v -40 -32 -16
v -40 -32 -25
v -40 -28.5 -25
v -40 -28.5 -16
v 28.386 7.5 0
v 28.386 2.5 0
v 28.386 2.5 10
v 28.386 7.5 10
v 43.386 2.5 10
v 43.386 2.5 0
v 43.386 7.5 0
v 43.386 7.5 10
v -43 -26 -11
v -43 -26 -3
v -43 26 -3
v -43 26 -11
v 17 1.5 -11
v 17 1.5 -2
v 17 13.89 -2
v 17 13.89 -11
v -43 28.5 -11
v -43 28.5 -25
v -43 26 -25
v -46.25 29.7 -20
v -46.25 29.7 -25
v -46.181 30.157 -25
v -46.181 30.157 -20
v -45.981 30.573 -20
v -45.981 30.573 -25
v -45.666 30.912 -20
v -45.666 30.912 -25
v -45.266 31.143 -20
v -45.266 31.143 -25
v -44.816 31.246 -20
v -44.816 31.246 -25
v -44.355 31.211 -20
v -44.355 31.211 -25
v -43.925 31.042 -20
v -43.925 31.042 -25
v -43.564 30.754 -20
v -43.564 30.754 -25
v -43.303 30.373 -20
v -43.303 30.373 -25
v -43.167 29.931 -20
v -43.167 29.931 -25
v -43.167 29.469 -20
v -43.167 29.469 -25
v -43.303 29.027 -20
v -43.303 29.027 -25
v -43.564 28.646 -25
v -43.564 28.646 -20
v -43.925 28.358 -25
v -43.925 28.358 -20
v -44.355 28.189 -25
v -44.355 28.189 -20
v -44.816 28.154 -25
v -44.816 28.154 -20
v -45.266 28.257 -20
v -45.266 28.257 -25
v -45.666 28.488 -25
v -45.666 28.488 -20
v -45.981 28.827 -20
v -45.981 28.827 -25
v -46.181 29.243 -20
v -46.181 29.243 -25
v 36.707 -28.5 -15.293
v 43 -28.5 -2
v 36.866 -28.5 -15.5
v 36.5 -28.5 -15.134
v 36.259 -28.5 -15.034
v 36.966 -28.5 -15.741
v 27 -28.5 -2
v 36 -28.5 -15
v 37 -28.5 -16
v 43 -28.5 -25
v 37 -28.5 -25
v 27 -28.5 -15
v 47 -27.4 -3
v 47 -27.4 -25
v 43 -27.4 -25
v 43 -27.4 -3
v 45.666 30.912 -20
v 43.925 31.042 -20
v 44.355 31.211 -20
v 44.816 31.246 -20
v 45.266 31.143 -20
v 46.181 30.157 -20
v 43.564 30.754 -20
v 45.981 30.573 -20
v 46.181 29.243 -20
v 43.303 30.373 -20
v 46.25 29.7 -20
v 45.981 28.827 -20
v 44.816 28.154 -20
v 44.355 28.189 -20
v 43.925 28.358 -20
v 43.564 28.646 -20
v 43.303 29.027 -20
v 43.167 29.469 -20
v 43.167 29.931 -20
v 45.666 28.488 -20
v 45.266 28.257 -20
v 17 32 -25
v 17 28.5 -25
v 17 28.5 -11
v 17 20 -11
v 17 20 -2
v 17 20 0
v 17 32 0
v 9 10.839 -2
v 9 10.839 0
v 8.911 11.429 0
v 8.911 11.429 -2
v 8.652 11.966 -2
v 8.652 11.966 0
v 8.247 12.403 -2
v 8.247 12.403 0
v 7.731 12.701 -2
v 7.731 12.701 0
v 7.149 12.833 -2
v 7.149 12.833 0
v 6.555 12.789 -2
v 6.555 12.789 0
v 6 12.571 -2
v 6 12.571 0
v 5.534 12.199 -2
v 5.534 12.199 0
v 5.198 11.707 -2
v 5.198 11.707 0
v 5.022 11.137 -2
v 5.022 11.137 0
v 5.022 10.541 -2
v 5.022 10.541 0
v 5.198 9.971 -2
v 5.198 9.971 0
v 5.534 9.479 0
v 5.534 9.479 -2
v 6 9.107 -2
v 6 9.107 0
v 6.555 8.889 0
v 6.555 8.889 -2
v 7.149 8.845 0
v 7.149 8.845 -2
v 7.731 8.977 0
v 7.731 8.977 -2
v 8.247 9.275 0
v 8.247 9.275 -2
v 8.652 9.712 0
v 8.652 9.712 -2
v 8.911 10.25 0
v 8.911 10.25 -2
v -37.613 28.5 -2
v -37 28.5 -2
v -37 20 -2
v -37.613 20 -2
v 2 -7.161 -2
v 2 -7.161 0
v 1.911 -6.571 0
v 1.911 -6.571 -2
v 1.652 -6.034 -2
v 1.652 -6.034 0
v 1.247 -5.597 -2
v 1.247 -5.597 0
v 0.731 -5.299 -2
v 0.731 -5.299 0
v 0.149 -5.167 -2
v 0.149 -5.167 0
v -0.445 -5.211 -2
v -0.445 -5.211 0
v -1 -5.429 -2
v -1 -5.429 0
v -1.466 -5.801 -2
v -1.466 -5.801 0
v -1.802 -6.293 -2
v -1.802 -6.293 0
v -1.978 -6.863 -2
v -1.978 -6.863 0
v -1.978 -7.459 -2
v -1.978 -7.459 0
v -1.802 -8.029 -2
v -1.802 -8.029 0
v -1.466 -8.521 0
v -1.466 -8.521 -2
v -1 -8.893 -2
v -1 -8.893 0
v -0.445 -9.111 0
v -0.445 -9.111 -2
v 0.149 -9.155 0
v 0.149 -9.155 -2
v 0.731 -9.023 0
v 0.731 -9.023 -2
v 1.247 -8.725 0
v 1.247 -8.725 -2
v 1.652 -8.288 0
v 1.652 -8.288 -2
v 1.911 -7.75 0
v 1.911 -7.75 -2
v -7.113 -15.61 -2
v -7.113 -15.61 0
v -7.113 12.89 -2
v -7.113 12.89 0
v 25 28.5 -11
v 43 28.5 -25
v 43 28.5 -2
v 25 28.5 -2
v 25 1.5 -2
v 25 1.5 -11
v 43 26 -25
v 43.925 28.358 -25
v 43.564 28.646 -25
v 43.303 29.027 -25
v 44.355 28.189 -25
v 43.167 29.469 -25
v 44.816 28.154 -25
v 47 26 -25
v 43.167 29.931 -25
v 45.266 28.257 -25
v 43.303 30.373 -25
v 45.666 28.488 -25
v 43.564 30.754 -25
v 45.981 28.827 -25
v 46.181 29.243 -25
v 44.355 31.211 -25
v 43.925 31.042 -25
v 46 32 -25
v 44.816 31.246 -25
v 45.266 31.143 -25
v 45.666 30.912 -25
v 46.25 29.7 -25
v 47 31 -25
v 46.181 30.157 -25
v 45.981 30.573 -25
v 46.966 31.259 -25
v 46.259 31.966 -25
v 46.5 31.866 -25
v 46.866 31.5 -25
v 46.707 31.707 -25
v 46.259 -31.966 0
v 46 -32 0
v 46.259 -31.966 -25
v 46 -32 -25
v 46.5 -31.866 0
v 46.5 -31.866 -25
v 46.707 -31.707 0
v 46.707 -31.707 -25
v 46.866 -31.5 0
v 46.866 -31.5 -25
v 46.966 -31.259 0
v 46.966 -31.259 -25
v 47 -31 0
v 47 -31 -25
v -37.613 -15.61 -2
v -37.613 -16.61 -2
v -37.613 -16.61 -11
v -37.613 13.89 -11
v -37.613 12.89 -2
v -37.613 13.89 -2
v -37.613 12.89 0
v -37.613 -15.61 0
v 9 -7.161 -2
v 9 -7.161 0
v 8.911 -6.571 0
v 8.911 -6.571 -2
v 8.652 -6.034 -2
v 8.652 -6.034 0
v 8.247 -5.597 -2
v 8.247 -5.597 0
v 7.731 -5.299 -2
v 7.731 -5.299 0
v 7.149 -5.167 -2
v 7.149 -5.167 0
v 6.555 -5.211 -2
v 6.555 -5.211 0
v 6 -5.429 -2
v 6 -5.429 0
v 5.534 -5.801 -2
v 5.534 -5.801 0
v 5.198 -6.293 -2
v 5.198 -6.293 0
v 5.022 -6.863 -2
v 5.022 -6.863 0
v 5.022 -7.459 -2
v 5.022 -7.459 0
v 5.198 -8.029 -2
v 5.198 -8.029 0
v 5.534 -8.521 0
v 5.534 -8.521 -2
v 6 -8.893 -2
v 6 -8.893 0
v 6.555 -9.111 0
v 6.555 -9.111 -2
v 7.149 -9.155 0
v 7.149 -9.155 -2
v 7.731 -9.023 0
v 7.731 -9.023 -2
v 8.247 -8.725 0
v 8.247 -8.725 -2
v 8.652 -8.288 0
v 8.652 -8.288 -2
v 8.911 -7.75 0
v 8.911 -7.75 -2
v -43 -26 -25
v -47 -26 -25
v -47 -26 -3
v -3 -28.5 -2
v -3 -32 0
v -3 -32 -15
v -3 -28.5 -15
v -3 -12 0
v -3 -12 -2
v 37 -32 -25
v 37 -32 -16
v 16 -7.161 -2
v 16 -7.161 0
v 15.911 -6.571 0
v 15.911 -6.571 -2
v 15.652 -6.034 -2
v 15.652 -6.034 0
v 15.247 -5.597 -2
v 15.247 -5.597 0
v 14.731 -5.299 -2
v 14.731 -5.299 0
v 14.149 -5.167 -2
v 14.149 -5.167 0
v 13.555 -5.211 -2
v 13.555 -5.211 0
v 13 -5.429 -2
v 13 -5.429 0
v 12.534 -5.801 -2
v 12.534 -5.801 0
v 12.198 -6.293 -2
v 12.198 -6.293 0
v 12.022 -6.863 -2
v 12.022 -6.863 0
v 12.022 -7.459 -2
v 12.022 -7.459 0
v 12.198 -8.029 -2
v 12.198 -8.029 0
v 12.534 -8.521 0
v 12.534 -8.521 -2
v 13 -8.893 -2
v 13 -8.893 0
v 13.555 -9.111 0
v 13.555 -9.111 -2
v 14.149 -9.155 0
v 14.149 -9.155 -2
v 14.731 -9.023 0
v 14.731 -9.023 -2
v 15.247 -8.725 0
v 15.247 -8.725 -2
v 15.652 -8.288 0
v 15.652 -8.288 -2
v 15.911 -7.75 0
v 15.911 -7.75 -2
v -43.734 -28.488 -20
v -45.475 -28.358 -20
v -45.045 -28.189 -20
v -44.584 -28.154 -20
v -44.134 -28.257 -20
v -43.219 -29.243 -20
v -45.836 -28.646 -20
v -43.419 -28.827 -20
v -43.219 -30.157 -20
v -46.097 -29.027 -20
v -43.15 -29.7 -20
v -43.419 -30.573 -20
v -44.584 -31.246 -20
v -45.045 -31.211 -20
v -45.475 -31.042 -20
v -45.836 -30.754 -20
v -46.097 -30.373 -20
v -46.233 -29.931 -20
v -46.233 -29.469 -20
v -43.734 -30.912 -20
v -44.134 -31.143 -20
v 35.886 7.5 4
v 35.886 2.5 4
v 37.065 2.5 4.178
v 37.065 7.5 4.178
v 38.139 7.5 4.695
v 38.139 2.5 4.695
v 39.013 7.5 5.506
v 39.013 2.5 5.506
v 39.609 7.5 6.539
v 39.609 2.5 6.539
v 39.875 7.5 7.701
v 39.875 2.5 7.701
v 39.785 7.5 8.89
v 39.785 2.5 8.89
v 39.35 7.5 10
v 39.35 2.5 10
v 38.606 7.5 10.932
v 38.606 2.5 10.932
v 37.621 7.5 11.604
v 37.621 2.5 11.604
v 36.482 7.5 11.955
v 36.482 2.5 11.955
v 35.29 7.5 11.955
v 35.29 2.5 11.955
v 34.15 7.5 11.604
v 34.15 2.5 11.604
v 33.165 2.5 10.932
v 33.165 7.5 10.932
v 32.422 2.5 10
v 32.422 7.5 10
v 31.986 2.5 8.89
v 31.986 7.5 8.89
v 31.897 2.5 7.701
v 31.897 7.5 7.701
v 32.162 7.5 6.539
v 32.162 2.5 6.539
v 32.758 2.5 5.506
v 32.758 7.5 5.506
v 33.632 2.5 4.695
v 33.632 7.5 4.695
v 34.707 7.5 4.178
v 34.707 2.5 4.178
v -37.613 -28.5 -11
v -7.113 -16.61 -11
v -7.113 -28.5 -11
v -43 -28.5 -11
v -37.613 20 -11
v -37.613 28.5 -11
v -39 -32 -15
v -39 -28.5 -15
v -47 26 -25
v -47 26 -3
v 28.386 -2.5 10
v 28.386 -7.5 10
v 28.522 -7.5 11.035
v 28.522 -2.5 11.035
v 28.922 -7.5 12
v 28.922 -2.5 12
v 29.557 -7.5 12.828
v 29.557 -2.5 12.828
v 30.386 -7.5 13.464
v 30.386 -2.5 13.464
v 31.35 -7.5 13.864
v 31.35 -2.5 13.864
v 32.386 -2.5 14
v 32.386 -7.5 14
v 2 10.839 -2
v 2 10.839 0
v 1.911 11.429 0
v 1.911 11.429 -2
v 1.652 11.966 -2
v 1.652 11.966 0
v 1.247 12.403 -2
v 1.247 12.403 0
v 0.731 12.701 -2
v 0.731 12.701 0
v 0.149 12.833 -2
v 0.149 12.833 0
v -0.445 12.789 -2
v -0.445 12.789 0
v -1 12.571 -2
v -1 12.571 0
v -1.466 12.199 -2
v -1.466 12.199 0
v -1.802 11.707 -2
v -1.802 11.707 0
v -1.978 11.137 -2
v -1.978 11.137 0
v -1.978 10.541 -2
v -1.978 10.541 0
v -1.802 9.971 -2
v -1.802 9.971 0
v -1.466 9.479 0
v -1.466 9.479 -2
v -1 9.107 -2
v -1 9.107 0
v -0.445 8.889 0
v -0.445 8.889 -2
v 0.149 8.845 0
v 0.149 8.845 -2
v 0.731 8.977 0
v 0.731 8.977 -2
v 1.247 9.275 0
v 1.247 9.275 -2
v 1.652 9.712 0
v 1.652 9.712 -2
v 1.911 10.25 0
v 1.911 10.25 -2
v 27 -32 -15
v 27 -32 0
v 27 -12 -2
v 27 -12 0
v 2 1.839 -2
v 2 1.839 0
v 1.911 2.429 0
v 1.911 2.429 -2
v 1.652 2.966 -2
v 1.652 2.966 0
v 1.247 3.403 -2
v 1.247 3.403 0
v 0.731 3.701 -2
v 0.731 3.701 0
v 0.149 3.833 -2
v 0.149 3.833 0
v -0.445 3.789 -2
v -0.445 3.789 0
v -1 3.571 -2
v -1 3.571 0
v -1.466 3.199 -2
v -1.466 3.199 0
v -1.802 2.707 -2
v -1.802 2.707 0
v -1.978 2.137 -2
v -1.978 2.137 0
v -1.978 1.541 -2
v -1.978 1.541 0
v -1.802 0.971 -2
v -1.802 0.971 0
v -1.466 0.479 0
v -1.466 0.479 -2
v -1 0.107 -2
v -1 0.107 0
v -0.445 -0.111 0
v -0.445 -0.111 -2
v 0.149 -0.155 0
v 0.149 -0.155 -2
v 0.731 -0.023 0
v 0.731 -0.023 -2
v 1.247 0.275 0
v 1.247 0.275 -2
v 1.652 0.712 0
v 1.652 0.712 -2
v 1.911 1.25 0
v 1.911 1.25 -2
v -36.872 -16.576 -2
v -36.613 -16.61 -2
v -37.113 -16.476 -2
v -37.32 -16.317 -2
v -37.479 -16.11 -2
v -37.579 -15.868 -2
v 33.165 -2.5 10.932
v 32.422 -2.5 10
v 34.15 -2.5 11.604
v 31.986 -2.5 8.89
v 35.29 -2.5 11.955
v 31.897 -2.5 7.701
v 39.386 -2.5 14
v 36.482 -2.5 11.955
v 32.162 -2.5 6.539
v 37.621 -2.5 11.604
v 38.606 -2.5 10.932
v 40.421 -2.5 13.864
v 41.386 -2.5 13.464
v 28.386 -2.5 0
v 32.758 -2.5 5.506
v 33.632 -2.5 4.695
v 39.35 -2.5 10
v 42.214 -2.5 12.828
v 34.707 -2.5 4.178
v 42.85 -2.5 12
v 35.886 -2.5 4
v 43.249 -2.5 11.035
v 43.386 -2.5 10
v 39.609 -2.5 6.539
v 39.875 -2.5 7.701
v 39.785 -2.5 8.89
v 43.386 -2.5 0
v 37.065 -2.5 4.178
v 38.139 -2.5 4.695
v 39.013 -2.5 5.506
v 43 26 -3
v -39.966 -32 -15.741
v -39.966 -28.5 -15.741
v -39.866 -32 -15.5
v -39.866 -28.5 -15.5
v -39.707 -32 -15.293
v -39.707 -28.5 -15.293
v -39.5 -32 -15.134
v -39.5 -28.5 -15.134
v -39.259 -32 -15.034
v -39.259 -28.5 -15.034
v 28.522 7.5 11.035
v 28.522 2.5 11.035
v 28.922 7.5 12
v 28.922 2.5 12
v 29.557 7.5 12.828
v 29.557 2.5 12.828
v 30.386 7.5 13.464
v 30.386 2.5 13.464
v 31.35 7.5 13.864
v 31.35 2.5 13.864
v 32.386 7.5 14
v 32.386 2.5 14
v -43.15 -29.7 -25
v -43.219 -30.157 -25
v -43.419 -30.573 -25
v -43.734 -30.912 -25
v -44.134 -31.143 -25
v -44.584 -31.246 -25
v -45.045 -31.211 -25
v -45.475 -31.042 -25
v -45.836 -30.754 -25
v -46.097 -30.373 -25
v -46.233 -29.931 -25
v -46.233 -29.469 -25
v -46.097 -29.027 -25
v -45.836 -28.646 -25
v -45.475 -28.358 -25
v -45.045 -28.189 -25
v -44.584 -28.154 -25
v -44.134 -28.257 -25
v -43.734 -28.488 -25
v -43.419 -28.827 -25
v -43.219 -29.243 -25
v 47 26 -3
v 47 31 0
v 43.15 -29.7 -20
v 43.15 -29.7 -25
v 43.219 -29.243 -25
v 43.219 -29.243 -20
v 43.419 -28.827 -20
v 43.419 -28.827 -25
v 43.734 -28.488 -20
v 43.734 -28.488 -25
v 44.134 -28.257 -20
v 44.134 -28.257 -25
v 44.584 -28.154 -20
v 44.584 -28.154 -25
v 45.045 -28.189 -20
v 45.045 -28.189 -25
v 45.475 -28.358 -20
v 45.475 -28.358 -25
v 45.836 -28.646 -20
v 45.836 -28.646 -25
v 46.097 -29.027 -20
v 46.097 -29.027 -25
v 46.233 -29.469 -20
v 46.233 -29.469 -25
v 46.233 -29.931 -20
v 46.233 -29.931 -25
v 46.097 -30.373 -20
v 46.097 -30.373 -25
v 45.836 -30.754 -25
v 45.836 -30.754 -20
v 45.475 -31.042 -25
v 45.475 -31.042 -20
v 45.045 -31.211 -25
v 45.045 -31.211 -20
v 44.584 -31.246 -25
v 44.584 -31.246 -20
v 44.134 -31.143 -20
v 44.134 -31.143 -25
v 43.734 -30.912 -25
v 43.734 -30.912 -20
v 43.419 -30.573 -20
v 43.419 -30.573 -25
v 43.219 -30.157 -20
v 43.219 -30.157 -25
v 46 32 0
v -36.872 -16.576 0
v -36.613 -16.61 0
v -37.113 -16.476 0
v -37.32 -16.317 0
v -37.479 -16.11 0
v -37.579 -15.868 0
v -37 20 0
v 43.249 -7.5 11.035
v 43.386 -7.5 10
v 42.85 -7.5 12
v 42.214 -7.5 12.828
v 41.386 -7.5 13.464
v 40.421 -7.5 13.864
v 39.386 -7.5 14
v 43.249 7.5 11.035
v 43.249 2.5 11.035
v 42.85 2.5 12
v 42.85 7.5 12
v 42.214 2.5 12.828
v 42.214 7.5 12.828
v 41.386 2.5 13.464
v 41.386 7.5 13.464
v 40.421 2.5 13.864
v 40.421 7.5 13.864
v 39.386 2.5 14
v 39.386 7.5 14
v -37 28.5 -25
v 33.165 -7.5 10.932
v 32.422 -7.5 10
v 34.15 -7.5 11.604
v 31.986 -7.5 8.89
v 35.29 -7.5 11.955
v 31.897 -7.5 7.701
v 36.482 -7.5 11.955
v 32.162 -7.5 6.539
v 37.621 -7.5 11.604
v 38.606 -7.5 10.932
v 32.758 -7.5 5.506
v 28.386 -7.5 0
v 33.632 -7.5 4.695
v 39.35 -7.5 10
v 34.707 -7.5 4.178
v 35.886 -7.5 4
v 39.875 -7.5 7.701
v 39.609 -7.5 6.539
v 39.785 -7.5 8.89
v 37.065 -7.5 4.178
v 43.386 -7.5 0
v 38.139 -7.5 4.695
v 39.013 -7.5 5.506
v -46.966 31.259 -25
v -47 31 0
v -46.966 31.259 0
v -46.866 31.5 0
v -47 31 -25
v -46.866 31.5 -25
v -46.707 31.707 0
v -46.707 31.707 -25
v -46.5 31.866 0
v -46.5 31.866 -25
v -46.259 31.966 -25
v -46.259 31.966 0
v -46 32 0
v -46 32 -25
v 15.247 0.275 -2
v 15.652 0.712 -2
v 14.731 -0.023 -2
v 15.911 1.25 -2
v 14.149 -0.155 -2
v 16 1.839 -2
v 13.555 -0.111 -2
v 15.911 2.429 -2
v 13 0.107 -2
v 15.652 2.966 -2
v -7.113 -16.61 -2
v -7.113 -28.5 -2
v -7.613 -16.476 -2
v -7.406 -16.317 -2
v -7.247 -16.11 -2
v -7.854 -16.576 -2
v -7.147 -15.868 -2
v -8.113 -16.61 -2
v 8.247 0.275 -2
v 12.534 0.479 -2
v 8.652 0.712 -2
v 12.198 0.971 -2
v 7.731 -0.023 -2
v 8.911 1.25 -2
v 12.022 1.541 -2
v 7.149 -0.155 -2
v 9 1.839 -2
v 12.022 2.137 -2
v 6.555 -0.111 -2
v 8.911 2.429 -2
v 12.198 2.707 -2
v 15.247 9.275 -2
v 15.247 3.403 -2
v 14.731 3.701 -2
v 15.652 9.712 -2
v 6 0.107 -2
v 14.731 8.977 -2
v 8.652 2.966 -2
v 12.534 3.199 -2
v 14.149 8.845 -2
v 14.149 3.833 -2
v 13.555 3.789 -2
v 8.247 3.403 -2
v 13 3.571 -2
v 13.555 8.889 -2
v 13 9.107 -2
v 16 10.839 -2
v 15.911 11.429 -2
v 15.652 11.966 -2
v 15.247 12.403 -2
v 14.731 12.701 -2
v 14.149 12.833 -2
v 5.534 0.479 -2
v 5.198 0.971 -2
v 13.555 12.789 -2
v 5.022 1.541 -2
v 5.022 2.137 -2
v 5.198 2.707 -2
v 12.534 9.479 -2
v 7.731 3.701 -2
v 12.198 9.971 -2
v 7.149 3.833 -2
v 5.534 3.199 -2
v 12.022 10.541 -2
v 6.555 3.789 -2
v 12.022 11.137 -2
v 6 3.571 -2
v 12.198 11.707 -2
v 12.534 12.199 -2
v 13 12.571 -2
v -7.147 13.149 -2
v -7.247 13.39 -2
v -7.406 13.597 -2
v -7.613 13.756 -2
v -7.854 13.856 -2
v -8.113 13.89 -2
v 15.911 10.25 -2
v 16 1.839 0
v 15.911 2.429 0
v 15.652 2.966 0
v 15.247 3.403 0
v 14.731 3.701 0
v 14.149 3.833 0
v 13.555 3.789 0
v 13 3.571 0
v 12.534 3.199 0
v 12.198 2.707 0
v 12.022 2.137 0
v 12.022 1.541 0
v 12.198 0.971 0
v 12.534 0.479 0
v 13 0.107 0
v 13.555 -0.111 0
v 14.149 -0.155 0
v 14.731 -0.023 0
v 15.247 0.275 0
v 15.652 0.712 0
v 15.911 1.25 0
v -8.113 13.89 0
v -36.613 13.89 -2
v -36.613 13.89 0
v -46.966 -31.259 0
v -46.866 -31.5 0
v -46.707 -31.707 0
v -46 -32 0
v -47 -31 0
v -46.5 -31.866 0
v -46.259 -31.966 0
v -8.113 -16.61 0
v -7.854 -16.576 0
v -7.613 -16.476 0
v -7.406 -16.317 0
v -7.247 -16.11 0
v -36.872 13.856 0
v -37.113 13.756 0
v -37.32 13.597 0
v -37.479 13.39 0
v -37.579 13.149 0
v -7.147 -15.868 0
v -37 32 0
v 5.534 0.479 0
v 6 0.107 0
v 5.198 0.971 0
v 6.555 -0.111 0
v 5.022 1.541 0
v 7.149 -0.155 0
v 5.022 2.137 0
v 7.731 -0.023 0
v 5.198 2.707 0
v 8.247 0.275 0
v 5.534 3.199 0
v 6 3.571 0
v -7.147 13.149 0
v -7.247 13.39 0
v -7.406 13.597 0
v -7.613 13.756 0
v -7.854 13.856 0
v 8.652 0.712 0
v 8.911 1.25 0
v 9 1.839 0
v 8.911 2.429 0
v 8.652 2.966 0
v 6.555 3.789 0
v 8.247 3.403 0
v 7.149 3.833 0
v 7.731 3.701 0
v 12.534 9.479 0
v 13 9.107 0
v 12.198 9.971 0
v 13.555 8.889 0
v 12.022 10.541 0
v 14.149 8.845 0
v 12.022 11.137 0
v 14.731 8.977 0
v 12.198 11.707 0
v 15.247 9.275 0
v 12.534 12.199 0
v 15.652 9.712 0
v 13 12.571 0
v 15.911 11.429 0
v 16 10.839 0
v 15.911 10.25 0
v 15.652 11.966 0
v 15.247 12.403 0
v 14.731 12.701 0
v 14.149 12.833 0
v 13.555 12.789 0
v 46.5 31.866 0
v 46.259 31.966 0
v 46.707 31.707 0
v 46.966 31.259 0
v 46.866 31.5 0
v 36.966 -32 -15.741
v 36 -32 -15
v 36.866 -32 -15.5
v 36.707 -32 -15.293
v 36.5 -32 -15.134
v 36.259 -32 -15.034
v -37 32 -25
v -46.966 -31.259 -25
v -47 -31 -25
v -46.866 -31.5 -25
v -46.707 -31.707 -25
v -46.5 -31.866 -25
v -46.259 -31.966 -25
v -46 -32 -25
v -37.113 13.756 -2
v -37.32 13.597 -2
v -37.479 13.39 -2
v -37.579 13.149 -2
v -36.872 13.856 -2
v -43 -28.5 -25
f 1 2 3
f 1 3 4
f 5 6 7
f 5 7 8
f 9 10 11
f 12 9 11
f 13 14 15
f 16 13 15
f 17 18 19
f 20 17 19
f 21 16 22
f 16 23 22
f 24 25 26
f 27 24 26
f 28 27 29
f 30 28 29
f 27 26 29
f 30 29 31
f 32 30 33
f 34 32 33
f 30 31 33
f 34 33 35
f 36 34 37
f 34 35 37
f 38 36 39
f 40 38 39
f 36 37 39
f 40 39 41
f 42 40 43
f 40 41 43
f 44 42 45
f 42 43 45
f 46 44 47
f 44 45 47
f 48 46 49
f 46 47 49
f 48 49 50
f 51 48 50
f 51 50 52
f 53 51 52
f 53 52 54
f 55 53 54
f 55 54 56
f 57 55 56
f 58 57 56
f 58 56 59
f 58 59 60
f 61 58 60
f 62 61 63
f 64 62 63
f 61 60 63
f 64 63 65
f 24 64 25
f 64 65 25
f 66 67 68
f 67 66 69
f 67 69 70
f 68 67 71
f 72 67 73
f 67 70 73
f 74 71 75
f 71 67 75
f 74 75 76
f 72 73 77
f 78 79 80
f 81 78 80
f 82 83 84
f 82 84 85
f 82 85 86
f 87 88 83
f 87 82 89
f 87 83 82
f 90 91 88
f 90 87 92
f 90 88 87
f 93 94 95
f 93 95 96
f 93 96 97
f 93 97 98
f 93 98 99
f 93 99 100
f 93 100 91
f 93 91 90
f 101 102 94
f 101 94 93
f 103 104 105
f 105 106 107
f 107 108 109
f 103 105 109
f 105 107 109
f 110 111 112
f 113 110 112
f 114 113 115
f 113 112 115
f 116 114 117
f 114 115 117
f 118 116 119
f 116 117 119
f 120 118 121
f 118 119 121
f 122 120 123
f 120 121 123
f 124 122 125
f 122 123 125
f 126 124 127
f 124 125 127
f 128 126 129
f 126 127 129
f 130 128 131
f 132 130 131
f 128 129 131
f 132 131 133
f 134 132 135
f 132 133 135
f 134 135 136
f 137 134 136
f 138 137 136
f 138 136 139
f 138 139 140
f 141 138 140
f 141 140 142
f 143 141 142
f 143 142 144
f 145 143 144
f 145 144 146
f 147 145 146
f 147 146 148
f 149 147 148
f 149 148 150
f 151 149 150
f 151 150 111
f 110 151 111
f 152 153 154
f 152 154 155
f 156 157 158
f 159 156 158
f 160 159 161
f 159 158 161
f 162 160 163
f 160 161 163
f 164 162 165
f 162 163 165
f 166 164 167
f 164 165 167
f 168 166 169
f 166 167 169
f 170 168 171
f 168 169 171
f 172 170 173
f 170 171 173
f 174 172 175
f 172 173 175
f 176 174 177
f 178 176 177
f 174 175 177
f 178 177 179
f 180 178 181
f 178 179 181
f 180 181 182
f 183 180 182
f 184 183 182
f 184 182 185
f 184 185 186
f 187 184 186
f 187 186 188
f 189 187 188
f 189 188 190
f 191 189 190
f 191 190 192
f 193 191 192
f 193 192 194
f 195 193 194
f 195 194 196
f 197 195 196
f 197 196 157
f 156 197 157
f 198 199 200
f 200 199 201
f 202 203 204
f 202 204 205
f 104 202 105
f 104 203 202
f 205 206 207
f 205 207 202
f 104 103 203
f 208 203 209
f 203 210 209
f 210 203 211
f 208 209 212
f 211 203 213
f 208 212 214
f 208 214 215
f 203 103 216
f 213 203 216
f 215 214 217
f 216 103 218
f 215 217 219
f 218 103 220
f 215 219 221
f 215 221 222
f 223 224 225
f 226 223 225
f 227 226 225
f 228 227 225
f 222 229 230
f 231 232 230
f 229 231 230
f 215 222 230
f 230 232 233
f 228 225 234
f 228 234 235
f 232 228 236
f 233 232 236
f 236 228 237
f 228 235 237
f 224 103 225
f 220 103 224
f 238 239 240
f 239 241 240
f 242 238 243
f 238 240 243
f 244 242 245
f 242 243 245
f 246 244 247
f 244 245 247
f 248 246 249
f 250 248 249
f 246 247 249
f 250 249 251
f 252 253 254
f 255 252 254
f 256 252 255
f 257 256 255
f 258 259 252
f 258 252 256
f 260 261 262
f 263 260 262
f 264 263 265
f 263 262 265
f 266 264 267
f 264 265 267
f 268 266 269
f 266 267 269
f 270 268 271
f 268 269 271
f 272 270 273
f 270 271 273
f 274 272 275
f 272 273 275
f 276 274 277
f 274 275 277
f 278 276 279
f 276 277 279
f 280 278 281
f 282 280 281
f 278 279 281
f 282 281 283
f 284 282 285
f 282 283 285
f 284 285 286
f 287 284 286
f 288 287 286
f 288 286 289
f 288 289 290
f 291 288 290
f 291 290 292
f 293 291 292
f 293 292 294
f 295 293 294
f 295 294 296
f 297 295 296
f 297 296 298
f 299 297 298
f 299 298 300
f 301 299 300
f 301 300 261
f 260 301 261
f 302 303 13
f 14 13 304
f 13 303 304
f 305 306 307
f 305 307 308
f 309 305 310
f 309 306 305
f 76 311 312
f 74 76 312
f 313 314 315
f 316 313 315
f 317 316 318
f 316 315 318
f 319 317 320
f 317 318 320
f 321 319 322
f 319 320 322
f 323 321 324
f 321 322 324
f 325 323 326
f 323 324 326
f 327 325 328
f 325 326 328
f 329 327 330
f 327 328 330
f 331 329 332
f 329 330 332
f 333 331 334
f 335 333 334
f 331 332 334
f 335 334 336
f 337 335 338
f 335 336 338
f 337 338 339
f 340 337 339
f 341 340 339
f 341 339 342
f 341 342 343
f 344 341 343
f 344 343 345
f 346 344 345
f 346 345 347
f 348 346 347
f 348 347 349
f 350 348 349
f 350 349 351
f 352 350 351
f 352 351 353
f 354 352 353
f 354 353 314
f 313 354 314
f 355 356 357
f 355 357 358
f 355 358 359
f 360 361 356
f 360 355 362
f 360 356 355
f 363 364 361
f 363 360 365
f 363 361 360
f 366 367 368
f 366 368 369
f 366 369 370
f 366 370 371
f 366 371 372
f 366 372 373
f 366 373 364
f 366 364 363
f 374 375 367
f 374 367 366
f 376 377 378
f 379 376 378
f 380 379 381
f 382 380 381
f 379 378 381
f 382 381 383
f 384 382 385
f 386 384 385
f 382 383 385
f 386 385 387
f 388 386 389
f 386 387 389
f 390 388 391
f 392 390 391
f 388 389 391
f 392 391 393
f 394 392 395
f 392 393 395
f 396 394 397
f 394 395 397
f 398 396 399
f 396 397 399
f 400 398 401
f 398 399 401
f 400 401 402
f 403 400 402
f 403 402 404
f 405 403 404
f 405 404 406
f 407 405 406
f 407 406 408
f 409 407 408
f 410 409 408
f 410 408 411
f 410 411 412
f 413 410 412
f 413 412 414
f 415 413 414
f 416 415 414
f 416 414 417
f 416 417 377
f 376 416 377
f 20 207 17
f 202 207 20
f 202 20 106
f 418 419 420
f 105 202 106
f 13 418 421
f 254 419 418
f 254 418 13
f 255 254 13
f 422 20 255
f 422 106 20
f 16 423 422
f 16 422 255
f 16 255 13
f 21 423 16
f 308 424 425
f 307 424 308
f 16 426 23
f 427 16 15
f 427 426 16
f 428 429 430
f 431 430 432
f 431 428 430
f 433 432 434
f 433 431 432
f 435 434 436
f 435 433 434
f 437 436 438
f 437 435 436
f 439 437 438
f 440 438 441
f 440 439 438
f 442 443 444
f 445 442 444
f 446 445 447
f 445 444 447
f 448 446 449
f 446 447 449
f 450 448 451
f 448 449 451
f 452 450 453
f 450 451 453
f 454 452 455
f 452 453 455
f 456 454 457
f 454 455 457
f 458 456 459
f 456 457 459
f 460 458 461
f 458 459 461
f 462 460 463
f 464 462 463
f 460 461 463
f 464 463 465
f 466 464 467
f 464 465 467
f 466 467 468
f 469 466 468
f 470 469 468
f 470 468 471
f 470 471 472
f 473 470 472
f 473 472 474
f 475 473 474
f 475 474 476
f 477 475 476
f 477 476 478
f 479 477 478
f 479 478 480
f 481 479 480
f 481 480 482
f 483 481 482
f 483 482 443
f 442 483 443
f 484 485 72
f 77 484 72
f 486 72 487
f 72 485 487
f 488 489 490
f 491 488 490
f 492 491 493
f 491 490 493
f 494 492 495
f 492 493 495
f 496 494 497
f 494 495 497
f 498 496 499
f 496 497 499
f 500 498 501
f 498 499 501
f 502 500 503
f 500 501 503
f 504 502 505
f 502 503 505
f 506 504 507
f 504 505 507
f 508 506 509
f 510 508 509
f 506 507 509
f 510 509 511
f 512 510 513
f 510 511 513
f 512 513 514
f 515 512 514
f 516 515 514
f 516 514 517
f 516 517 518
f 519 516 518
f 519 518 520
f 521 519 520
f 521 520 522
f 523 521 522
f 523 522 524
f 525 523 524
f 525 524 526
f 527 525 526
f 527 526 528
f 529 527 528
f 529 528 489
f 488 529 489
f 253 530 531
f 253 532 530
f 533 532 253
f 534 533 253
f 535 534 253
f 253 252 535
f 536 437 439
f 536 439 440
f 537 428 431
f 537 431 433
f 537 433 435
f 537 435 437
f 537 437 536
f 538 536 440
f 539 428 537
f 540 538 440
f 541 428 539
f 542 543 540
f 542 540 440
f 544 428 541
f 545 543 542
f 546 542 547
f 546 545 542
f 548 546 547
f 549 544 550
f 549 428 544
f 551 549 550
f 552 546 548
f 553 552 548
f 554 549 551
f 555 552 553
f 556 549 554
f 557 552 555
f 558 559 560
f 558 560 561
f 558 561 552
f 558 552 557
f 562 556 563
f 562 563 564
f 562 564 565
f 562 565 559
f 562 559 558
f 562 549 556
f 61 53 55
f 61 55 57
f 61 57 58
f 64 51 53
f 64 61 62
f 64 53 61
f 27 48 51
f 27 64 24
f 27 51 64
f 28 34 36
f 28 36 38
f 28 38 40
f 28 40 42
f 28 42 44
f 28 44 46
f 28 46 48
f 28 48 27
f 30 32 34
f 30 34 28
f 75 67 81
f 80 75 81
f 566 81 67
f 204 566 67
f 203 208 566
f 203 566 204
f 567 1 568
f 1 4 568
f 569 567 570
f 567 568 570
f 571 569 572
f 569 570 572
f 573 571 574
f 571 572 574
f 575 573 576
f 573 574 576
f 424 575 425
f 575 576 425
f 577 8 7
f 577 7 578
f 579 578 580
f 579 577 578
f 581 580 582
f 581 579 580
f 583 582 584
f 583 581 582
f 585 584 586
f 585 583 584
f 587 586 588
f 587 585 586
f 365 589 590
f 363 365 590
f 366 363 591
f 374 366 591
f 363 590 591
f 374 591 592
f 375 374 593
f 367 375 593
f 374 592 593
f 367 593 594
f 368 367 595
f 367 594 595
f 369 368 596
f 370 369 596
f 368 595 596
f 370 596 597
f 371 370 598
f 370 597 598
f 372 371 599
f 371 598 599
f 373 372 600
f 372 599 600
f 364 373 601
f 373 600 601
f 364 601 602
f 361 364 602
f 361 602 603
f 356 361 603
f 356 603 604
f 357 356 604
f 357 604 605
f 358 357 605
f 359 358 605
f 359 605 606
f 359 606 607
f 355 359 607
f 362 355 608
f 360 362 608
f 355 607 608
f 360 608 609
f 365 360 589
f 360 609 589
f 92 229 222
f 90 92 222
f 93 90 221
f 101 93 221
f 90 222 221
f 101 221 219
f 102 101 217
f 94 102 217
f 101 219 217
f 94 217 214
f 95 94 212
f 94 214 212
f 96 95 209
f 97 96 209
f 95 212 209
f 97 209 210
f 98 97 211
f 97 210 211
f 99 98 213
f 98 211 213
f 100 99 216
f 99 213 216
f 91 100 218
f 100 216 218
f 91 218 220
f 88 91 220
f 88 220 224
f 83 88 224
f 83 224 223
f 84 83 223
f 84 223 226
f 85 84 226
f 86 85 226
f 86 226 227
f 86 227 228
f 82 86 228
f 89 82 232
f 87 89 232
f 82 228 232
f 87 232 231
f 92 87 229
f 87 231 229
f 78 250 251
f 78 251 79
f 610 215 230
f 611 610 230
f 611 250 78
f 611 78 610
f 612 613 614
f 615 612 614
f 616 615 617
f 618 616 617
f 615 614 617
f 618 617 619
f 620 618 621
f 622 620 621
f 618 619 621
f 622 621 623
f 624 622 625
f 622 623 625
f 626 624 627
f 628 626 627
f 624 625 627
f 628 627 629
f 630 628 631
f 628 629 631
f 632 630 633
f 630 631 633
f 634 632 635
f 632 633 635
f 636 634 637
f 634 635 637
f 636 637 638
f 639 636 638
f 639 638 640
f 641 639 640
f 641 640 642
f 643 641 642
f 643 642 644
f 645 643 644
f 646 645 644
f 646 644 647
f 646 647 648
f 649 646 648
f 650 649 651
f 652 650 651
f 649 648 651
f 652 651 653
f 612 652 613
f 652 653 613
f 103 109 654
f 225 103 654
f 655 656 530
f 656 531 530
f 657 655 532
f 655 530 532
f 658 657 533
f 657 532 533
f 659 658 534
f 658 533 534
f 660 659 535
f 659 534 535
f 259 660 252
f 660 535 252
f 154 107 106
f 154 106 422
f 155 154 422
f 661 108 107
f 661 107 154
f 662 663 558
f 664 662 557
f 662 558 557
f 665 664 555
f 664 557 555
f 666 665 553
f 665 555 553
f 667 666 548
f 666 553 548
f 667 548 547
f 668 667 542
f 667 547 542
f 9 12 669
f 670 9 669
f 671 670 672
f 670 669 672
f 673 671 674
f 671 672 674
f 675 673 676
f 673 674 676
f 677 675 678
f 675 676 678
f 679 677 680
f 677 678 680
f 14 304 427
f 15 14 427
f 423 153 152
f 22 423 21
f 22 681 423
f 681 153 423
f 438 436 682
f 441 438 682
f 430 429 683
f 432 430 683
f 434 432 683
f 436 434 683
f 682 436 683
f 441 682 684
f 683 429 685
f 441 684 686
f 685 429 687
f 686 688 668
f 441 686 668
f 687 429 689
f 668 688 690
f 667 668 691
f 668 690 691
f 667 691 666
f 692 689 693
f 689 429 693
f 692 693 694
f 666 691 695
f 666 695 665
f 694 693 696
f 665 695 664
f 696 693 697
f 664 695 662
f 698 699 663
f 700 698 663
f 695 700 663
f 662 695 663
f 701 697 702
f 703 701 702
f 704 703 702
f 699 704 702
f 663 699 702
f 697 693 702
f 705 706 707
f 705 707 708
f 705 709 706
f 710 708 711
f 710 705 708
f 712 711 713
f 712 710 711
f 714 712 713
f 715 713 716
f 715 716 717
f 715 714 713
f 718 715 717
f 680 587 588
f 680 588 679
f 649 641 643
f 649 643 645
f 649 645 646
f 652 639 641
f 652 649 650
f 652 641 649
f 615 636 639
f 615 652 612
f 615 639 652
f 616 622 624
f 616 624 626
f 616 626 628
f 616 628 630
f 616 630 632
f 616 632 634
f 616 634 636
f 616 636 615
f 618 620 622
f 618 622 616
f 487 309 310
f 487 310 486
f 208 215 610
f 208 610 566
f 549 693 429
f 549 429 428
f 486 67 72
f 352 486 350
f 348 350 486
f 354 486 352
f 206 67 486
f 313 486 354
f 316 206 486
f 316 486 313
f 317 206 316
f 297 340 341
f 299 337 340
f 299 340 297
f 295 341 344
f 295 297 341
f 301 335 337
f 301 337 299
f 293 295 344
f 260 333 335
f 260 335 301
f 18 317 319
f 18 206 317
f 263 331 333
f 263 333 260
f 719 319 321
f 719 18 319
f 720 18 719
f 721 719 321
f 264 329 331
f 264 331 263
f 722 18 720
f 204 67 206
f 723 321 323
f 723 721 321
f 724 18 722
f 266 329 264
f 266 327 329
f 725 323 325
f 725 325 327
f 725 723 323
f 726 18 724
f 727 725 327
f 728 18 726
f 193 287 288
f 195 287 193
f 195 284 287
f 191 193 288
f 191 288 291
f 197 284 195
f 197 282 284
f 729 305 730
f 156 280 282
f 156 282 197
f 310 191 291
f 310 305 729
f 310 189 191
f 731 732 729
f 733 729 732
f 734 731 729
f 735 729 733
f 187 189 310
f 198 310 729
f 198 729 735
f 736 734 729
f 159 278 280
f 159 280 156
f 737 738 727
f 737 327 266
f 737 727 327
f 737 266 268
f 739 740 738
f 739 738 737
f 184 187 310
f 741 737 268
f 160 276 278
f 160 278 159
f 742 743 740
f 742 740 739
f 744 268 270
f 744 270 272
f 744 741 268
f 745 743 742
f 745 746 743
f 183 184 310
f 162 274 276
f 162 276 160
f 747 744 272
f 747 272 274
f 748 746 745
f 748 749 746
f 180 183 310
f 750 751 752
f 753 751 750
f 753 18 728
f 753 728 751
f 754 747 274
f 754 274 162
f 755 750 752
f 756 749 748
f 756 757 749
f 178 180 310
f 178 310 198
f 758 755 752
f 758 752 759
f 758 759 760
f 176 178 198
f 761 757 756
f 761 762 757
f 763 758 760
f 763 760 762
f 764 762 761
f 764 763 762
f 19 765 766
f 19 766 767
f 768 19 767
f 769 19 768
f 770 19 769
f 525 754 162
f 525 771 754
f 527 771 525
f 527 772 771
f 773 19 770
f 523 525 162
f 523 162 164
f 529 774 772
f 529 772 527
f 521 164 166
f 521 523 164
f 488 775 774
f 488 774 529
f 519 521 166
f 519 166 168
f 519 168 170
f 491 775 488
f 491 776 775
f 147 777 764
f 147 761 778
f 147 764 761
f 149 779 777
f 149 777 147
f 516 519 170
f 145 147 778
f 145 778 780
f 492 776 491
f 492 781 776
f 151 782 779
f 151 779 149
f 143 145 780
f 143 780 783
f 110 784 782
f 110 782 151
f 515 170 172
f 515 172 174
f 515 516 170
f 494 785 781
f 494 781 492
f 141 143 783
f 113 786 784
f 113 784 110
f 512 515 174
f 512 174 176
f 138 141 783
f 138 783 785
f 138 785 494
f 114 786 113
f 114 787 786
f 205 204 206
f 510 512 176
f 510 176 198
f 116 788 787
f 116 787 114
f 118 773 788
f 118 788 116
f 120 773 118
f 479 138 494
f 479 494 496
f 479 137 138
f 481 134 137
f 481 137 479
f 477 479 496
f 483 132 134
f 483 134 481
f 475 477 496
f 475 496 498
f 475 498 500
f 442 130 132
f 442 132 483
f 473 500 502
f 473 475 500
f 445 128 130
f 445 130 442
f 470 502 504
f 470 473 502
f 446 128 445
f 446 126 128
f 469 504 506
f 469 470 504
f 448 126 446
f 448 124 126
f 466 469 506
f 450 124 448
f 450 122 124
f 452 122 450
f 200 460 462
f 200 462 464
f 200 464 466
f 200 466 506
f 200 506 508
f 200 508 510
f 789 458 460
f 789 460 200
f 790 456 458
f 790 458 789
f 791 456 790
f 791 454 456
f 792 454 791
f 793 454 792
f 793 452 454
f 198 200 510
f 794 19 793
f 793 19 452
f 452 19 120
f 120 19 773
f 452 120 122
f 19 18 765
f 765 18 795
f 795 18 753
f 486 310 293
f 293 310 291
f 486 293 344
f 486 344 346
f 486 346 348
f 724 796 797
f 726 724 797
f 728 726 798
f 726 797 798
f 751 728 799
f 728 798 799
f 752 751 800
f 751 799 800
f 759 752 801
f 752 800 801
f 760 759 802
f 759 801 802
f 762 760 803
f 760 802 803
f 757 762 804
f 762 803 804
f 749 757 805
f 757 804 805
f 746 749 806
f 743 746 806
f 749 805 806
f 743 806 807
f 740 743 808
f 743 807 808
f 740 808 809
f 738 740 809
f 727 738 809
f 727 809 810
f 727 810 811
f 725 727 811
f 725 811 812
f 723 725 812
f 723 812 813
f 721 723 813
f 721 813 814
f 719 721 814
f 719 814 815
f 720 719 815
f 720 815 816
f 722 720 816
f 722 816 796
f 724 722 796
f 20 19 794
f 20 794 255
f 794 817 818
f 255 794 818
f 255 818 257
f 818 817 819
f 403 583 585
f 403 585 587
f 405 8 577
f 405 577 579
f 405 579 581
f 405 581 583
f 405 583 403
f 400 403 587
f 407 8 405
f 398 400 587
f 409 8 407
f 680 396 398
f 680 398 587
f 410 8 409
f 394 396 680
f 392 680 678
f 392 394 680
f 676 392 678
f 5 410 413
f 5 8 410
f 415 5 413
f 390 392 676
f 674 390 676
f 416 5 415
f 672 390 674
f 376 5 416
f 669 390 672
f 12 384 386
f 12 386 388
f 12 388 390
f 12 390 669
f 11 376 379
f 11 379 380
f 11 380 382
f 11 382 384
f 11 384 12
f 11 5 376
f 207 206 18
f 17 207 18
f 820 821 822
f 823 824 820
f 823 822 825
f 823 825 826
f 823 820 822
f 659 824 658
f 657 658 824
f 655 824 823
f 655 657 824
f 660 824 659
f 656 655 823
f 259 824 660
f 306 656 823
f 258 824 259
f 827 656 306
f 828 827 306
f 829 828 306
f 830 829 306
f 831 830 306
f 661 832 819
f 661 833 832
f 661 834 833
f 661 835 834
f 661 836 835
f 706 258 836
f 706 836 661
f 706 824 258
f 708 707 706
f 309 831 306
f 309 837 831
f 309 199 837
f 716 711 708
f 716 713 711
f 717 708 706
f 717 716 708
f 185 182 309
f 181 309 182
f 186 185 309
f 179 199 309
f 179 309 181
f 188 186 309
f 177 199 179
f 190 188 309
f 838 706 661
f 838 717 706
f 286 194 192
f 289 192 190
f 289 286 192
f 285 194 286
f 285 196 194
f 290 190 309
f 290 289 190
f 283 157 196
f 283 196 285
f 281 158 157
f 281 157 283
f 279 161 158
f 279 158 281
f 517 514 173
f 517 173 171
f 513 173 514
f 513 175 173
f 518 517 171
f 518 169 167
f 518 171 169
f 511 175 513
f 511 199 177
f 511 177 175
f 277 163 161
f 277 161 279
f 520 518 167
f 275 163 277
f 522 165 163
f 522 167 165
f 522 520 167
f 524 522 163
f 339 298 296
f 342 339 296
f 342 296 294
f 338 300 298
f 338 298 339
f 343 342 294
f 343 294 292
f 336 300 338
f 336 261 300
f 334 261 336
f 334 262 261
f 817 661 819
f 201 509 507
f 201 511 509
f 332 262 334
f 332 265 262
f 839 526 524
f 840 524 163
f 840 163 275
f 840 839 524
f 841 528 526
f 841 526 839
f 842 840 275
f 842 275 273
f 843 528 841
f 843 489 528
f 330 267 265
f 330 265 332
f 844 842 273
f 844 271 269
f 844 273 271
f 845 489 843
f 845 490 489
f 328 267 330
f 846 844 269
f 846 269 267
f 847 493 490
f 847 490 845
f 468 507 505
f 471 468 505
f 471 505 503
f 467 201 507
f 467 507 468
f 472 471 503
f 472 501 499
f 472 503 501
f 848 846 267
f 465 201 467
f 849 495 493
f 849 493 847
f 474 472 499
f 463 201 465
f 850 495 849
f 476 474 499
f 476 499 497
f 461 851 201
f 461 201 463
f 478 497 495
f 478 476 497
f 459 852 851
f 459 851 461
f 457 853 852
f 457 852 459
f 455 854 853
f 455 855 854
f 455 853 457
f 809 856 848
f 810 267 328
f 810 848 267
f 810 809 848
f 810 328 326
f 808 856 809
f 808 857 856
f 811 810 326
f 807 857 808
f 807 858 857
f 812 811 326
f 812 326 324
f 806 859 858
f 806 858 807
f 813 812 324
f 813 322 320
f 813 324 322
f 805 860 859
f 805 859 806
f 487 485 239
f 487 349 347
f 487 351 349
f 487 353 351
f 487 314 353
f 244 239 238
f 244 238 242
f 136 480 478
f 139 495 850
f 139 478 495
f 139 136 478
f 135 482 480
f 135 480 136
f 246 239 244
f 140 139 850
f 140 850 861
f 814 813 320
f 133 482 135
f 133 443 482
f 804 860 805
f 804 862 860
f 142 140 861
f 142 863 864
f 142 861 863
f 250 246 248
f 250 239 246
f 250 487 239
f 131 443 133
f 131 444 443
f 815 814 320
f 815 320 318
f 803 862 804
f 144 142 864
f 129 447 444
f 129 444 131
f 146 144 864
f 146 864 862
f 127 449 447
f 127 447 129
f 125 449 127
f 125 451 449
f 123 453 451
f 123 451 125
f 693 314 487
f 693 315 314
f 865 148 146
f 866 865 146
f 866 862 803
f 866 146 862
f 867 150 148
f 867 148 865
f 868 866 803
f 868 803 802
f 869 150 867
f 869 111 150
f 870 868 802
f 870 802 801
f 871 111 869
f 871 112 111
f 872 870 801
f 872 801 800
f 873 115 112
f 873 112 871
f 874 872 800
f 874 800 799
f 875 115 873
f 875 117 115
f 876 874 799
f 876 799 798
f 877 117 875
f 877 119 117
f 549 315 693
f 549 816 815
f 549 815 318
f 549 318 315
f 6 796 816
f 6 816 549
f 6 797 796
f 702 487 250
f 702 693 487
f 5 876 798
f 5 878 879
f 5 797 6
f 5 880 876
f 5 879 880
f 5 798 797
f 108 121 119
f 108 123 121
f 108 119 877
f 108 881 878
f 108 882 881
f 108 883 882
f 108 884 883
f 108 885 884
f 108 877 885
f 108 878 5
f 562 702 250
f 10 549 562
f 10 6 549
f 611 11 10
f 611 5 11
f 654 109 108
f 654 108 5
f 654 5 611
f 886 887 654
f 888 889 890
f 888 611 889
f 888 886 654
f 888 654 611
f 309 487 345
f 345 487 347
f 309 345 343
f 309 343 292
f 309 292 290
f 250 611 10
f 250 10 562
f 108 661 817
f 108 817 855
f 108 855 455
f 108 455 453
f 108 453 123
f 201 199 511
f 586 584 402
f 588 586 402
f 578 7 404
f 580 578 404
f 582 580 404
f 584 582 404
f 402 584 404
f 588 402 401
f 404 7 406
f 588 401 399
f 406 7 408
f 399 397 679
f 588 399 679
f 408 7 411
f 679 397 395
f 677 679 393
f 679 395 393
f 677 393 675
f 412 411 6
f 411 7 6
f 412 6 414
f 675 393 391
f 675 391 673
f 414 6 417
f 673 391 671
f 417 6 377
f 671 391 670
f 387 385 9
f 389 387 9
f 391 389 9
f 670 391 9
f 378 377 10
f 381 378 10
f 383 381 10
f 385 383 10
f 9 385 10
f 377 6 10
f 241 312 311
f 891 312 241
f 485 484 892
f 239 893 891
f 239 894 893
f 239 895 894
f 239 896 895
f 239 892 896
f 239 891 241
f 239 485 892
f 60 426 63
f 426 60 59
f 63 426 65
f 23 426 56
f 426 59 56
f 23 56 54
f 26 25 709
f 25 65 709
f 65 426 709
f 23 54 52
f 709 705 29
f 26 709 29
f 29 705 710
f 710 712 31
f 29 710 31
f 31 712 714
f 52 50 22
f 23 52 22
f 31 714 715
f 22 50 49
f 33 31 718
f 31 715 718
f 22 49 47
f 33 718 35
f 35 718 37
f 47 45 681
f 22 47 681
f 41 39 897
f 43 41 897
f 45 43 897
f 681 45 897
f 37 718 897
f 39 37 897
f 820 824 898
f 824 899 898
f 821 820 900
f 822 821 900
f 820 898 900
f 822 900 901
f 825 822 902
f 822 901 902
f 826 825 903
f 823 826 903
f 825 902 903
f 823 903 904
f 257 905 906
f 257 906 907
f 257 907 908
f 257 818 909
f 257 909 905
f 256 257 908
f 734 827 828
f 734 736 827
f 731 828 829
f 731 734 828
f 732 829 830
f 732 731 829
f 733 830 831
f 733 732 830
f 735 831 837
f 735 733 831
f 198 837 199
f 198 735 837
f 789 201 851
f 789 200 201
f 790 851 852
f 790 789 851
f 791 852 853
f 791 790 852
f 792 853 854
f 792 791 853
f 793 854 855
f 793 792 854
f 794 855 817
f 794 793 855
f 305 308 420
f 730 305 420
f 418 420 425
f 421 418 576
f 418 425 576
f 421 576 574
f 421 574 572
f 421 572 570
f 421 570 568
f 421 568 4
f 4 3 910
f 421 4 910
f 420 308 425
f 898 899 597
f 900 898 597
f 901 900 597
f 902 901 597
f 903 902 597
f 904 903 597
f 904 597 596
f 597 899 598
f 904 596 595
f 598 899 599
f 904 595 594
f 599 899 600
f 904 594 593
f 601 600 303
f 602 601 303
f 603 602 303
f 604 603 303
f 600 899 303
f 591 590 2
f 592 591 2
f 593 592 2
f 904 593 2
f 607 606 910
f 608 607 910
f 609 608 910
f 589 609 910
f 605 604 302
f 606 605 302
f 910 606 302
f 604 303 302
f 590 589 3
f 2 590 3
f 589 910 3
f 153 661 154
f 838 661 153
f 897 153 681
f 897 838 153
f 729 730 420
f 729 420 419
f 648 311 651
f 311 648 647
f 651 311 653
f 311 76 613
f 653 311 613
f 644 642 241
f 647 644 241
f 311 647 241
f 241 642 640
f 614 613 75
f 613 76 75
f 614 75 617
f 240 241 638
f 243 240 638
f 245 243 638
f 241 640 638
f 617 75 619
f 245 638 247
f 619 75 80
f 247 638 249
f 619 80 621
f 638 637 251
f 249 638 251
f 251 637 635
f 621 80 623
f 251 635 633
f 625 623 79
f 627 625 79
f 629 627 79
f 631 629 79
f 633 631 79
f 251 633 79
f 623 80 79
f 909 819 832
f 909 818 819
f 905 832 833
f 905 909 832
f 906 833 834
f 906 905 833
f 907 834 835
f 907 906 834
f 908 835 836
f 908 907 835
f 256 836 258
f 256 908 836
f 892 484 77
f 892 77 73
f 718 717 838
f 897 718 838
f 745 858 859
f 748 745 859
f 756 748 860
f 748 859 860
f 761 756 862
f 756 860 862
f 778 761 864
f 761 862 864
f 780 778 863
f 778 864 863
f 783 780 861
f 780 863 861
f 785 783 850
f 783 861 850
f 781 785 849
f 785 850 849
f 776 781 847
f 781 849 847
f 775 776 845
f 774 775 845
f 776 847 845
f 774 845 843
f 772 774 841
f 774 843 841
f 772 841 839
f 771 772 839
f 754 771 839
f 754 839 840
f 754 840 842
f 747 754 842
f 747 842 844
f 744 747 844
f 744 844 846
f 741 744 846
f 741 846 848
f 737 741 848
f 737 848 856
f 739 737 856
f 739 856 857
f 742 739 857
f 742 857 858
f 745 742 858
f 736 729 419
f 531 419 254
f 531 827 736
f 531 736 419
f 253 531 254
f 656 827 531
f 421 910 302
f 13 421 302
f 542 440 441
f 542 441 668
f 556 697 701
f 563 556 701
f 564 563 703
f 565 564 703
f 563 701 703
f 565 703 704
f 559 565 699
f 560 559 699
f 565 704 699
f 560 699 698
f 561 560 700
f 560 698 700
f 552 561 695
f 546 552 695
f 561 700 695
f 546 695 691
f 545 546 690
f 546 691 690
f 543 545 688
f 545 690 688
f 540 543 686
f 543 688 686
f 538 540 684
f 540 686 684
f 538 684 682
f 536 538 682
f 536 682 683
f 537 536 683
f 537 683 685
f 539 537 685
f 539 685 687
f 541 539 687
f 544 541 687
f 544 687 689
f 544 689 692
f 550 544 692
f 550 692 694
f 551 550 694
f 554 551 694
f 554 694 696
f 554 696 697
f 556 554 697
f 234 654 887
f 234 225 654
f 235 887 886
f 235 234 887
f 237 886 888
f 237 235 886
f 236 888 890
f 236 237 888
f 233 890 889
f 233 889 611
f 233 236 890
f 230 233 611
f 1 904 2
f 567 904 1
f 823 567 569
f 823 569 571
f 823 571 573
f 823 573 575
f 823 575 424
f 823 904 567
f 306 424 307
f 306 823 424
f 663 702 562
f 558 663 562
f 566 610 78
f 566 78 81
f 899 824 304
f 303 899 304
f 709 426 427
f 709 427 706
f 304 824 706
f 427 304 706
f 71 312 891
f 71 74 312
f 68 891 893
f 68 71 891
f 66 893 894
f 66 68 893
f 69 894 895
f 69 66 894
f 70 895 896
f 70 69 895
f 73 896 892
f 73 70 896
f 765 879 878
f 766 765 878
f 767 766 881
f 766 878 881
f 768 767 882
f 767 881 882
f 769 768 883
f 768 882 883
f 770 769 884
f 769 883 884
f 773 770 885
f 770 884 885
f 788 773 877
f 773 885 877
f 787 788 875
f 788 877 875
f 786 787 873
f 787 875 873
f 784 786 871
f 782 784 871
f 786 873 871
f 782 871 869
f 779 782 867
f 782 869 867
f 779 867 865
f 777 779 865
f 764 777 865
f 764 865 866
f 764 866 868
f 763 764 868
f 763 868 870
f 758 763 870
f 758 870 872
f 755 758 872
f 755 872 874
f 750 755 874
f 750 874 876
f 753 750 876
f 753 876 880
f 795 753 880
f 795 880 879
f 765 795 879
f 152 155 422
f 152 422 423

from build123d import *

# Parameters (mm, degrees)
SKETCH_1_W           = 94
SKETCH_1_H           = 64
EXTRUDE_1_DEPTH      = 25
SKETCH_3_W           = 86
SKETCH_3_H           = 57
CUT_EXTRUDE_1_DEPTH  = 23
FILLET_1_R           = 1
SKETCH_4_W           = 77
SKETCH_4_H           = 10
CUT_EXTRUDE_3_DEPTH  = 5
FILLET_4_R           = 1
SKETCH_5_W           = 54
SKETCH_5_H           = 25
CUT_EXTRUDE_4_DEPTH  = 12
SKETCH_6_W           = 30
SKETCH_6_H           = 20
CUT_EXTRUDE_5_DEPTH  = 18
SKETCH_7_W           = 22
SKETCH_7_H           = 52
CUT_EXTRUDE_6_DEPTH  = 5
SKETCH_8_W           = 30.5
SKETCH_8_H           = 30.5
CUT_EXTRUDE_7_DEPTH  = 5
FILLET_5_R           = 1
SKETCH_9_R           = 1.55
CUT_EXTRUDE_8_DEPTH  = 5
SKETCH_10_W          = 4
SKETCH_10_H          = 53.4
CUT_EXTRUDE_9_DEPTH  = 22
SKETCH_11_W          = 30.5
SKETCH_11_H          = 11.890365251
EXTRUDE_2_DEPTH      = 9
SKETCH_12_W          = 54.61329803
SKETCH_12_H          = 6.109634749
SKETCH_12_W_2        = 5.38670197
SKETCH_12_H_2        = 57
SKETCH_12_W_3        = 8
SKETCH_12_H_3        = 27
EXTRUDE_3_DEPTH      = 9
SKETCH_13_R          = 2
CUT_EXTRUDE_10_DEPTH = 10
SKETCH_14_W          = 15
SKETCH_14_H          = 15
EXTRUDE_4_DEPTH      = 14
SKETCH_17_R          = 4
CUT_EXTRUDE_13_DEPTH = 67.289139382
FILLET_7_R           = 4
SKETCH_18_W          = 15
SKETCH_18_H          = 5
CUT_EXTRUDE_14_DEPTH = 63.112800613


with BuildPart() as part:
    # 草图1 → 凸台-拉伸1 (new body)
    with BuildSketch(Plane.XY):
        Rectangle(SKETCH_1_W, SKETCH_1_H)
    extrude(amount=-EXTRUDE_1_DEPTH)

    # 草图3 → 切除-拉伸1 (cut)
    with BuildSketch(Plane(origin=(0, 0, -25), x_dir=(-1, 0, 0), z_dir=(0, 0, -1))):
        Rectangle(SKETCH_3_W, SKETCH_3_H)
    extrude(amount=-CUT_EXTRUDE_1_DEPTH, mode=Mode.SUBTRACT)

    # 圆角1
    fillet_1_edges = [part.edges().sort_by_distance(p)[0] for p in [
        (47, -32, -12.5),
        (-47, -32, -12.5),
        (-47, 32, -12.5),
        (47, 32, -12.5),
    ]]
    fillet(fillet_1_edges, radius=FILLET_1_R)

    # 草图4 → 切除-拉伸3 (cut)
    with BuildSketch(Plane.XZ.offset(32)):
        with Locations((-1.5, -20)):
            Rectangle(SKETCH_4_W, SKETCH_4_H)
    extrude(amount=-CUT_EXTRUDE_3_DEPTH, mode=Mode.SUBTRACT)

    # 圆角4
    fillet_4_edges = [part.edges().sort_by_distance(p)[0] for p in [
        (37, -30.25, -15),
        (-40, -30.25, -15),
    ]]
    fillet(fillet_4_edges, radius=FILLET_4_R)

    # 草图5 → 切除-拉伸4 (cut)
    with BuildSketch(Plane(origin=(0, 32, 0), x_dir=(1, 0, 0), z_dir=(0, 1, 0))):
        with Locations((-10, 12.5)):
            Rectangle(SKETCH_5_W, SKETCH_5_H)
    extrude(amount=-CUT_EXTRUDE_4_DEPTH, mode=Mode.SUBTRACT)

    # 草图6 → 切除-拉伸5 (cut)
    with BuildSketch(Plane.XY):
        with Locations((12, -22)):
            Rectangle(SKETCH_6_W, SKETCH_6_H)
    extrude(amount=-CUT_EXTRUDE_5_DEPTH, mode=Mode.SUBTRACT)

    # 草图7 → 切除-拉伸6 (cut)
    with BuildSketch(Plane.ZY.offset(47)):
        with Locations((-14, 0)):
            Rectangle(SKETCH_7_W, SKETCH_7_H)
    extrude(amount=-CUT_EXTRUDE_6_DEPTH, mode=Mode.SUBTRACT)

    # 草图8 → 切除-拉伸7 (cut)
    with BuildSketch(Plane.XY):
        with Locations((-22.36329803, -1.359634749)):
            Rectangle(SKETCH_8_W, SKETCH_8_H)
    extrude(amount=-CUT_EXTRUDE_7_DEPTH, mode=Mode.SUBTRACT)

    # 圆角5
    fillet_5_edges = [part.edges().sort_by_distance(p)[0] for p in [
        (-7.11329803, 13.890365251, -1),
        (-7.11329803, -16.609634749, -1),
        (-37.61329803, -16.609634749, -1),
        (-37.61329803, 13.890365251, -1),
    ]]
    fillet(fillet_5_edges, radius=FILLET_5_R)

    # 草图9 → 切除-拉伸8 (cut)
    with BuildSketch(Plane(origin=(0, 0, -25), x_dir=(-1, 0, 0), z_dir=(0, 0, -1))):
        with Locations((44.7, 29.7)):
            Circle(SKETCH_9_R)
        with Locations(Location((44.7, -29.7, 0), (0, 0, 180))):
            Circle(SKETCH_9_R)
        with Locations((-44.7, -29.7)):
            Circle(SKETCH_9_R)
        with Locations(Location((-44.7, 29.7, 0), (0, 0, 180))):
            Circle(SKETCH_9_R)
    extrude(amount=-CUT_EXTRUDE_8_DEPTH, mode=Mode.SUBTRACT)

    # 草图10 → 切除-拉伸9 (cut)
    with BuildSketch(Plane(origin=(0, 0, -25), x_dir=(-1, 0, 0), z_dir=(0, 0, -1))):
        with Locations((-45, -0.7)):
            Rectangle(SKETCH_10_W, SKETCH_10_H)
    extrude(amount=-CUT_EXTRUDE_9_DEPTH, mode=Mode.SUBTRACT)

    # 草图11 → 凸台-拉伸2 (add)
    with BuildSketch(Plane(origin=(0, 0, -2), x_dir=(-1, 0, 0), z_dir=(0, 0, -1))):
        with Locations((22.36329803, -22.554817375)):
            Rectangle(SKETCH_11_W, SKETCH_11_H)
    extrude(amount=EXTRUDE_2_DEPTH)

    # 草图12 → 凸台-拉伸3 (add)
    with BuildSketch(Plane(origin=(0, 0, -2), x_dir=(-1, 0, 0), z_dir=(0, 0, -1))):
        with Locations((10.306649015, 16.945182625)):
            Rectangle(SKETCH_12_W, SKETCH_12_H)
        with Locations((40.306649015, 0)):
            Rectangle(SKETCH_12_W_2, SKETCH_12_H_2)
        with Locations((-21, 15)):
            Rectangle(SKETCH_12_W_3, SKETCH_12_H_3)
    extrude(amount=EXTRUDE_3_DEPTH)

    # 草图13 → 切除-拉伸10 (cut)
    with BuildSketch(Plane.XY):
        with Locations((0, 10.839030868)):
            Circle(SKETCH_13_R)
        with Locations((7, 10.839030868)):
            Circle(SKETCH_13_R)
        with Locations((14, 10.839030868)):
            Circle(SKETCH_13_R)
        with Locations((7, 1.839030868)):
            Circle(SKETCH_13_R)
        with Locations((14, 1.839030868)):
            Circle(SKETCH_13_R)
        with Locations((7, -7.160969132)):
            Circle(SKETCH_13_R)
        with Locations((14, -7.160969132)):
            Circle(SKETCH_13_R)
        with Locations((0, 1.839030868)):
            Circle(SKETCH_13_R)
        with Locations((0, -7.160969132)):
            Circle(SKETCH_13_R)
    extrude(amount=-CUT_EXTRUDE_10_DEPTH, mode=Mode.SUBTRACT)

    # 草图14 → 凸台-拉伸4 (add)
    with BuildSketch(Plane.XY):
        with Locations((35.885750834, 0)):
            Rectangle(SKETCH_14_W, SKETCH_14_H)
    extrude(amount=EXTRUDE_4_DEPTH)

    # 草图17 → 切除-拉伸13 (cut, through all)
    with BuildSketch(Plane.XZ.offset(7.5)):
        with Locations(Location((35.885750834, 8, 0), (0, 0, 270))):
            Circle(SKETCH_17_R)
    extrude(amount=-CUT_EXTRUDE_13_DEPTH, mode=Mode.SUBTRACT)

    # 圆角7
    fillet_7_edges = [part.edges().sort_by_distance(p)[0] for p in [
        (43.385750834, 0, 14),
        (28.385750834, 0, 14),
    ]]
    fillet(fillet_7_edges, radius=FILLET_7_R)

    # 草图18 → 切除-拉伸14 (cut, through all)
    with BuildSketch(Plane.XY):
        with Locations((35.885750834, 0)):
            Rectangle(SKETCH_18_W, SKETCH_18_H)
    extrude(amount=CUT_EXTRUDE_14_DEPTH, mode=Mode.SUBTRACT)


solid = part.part
